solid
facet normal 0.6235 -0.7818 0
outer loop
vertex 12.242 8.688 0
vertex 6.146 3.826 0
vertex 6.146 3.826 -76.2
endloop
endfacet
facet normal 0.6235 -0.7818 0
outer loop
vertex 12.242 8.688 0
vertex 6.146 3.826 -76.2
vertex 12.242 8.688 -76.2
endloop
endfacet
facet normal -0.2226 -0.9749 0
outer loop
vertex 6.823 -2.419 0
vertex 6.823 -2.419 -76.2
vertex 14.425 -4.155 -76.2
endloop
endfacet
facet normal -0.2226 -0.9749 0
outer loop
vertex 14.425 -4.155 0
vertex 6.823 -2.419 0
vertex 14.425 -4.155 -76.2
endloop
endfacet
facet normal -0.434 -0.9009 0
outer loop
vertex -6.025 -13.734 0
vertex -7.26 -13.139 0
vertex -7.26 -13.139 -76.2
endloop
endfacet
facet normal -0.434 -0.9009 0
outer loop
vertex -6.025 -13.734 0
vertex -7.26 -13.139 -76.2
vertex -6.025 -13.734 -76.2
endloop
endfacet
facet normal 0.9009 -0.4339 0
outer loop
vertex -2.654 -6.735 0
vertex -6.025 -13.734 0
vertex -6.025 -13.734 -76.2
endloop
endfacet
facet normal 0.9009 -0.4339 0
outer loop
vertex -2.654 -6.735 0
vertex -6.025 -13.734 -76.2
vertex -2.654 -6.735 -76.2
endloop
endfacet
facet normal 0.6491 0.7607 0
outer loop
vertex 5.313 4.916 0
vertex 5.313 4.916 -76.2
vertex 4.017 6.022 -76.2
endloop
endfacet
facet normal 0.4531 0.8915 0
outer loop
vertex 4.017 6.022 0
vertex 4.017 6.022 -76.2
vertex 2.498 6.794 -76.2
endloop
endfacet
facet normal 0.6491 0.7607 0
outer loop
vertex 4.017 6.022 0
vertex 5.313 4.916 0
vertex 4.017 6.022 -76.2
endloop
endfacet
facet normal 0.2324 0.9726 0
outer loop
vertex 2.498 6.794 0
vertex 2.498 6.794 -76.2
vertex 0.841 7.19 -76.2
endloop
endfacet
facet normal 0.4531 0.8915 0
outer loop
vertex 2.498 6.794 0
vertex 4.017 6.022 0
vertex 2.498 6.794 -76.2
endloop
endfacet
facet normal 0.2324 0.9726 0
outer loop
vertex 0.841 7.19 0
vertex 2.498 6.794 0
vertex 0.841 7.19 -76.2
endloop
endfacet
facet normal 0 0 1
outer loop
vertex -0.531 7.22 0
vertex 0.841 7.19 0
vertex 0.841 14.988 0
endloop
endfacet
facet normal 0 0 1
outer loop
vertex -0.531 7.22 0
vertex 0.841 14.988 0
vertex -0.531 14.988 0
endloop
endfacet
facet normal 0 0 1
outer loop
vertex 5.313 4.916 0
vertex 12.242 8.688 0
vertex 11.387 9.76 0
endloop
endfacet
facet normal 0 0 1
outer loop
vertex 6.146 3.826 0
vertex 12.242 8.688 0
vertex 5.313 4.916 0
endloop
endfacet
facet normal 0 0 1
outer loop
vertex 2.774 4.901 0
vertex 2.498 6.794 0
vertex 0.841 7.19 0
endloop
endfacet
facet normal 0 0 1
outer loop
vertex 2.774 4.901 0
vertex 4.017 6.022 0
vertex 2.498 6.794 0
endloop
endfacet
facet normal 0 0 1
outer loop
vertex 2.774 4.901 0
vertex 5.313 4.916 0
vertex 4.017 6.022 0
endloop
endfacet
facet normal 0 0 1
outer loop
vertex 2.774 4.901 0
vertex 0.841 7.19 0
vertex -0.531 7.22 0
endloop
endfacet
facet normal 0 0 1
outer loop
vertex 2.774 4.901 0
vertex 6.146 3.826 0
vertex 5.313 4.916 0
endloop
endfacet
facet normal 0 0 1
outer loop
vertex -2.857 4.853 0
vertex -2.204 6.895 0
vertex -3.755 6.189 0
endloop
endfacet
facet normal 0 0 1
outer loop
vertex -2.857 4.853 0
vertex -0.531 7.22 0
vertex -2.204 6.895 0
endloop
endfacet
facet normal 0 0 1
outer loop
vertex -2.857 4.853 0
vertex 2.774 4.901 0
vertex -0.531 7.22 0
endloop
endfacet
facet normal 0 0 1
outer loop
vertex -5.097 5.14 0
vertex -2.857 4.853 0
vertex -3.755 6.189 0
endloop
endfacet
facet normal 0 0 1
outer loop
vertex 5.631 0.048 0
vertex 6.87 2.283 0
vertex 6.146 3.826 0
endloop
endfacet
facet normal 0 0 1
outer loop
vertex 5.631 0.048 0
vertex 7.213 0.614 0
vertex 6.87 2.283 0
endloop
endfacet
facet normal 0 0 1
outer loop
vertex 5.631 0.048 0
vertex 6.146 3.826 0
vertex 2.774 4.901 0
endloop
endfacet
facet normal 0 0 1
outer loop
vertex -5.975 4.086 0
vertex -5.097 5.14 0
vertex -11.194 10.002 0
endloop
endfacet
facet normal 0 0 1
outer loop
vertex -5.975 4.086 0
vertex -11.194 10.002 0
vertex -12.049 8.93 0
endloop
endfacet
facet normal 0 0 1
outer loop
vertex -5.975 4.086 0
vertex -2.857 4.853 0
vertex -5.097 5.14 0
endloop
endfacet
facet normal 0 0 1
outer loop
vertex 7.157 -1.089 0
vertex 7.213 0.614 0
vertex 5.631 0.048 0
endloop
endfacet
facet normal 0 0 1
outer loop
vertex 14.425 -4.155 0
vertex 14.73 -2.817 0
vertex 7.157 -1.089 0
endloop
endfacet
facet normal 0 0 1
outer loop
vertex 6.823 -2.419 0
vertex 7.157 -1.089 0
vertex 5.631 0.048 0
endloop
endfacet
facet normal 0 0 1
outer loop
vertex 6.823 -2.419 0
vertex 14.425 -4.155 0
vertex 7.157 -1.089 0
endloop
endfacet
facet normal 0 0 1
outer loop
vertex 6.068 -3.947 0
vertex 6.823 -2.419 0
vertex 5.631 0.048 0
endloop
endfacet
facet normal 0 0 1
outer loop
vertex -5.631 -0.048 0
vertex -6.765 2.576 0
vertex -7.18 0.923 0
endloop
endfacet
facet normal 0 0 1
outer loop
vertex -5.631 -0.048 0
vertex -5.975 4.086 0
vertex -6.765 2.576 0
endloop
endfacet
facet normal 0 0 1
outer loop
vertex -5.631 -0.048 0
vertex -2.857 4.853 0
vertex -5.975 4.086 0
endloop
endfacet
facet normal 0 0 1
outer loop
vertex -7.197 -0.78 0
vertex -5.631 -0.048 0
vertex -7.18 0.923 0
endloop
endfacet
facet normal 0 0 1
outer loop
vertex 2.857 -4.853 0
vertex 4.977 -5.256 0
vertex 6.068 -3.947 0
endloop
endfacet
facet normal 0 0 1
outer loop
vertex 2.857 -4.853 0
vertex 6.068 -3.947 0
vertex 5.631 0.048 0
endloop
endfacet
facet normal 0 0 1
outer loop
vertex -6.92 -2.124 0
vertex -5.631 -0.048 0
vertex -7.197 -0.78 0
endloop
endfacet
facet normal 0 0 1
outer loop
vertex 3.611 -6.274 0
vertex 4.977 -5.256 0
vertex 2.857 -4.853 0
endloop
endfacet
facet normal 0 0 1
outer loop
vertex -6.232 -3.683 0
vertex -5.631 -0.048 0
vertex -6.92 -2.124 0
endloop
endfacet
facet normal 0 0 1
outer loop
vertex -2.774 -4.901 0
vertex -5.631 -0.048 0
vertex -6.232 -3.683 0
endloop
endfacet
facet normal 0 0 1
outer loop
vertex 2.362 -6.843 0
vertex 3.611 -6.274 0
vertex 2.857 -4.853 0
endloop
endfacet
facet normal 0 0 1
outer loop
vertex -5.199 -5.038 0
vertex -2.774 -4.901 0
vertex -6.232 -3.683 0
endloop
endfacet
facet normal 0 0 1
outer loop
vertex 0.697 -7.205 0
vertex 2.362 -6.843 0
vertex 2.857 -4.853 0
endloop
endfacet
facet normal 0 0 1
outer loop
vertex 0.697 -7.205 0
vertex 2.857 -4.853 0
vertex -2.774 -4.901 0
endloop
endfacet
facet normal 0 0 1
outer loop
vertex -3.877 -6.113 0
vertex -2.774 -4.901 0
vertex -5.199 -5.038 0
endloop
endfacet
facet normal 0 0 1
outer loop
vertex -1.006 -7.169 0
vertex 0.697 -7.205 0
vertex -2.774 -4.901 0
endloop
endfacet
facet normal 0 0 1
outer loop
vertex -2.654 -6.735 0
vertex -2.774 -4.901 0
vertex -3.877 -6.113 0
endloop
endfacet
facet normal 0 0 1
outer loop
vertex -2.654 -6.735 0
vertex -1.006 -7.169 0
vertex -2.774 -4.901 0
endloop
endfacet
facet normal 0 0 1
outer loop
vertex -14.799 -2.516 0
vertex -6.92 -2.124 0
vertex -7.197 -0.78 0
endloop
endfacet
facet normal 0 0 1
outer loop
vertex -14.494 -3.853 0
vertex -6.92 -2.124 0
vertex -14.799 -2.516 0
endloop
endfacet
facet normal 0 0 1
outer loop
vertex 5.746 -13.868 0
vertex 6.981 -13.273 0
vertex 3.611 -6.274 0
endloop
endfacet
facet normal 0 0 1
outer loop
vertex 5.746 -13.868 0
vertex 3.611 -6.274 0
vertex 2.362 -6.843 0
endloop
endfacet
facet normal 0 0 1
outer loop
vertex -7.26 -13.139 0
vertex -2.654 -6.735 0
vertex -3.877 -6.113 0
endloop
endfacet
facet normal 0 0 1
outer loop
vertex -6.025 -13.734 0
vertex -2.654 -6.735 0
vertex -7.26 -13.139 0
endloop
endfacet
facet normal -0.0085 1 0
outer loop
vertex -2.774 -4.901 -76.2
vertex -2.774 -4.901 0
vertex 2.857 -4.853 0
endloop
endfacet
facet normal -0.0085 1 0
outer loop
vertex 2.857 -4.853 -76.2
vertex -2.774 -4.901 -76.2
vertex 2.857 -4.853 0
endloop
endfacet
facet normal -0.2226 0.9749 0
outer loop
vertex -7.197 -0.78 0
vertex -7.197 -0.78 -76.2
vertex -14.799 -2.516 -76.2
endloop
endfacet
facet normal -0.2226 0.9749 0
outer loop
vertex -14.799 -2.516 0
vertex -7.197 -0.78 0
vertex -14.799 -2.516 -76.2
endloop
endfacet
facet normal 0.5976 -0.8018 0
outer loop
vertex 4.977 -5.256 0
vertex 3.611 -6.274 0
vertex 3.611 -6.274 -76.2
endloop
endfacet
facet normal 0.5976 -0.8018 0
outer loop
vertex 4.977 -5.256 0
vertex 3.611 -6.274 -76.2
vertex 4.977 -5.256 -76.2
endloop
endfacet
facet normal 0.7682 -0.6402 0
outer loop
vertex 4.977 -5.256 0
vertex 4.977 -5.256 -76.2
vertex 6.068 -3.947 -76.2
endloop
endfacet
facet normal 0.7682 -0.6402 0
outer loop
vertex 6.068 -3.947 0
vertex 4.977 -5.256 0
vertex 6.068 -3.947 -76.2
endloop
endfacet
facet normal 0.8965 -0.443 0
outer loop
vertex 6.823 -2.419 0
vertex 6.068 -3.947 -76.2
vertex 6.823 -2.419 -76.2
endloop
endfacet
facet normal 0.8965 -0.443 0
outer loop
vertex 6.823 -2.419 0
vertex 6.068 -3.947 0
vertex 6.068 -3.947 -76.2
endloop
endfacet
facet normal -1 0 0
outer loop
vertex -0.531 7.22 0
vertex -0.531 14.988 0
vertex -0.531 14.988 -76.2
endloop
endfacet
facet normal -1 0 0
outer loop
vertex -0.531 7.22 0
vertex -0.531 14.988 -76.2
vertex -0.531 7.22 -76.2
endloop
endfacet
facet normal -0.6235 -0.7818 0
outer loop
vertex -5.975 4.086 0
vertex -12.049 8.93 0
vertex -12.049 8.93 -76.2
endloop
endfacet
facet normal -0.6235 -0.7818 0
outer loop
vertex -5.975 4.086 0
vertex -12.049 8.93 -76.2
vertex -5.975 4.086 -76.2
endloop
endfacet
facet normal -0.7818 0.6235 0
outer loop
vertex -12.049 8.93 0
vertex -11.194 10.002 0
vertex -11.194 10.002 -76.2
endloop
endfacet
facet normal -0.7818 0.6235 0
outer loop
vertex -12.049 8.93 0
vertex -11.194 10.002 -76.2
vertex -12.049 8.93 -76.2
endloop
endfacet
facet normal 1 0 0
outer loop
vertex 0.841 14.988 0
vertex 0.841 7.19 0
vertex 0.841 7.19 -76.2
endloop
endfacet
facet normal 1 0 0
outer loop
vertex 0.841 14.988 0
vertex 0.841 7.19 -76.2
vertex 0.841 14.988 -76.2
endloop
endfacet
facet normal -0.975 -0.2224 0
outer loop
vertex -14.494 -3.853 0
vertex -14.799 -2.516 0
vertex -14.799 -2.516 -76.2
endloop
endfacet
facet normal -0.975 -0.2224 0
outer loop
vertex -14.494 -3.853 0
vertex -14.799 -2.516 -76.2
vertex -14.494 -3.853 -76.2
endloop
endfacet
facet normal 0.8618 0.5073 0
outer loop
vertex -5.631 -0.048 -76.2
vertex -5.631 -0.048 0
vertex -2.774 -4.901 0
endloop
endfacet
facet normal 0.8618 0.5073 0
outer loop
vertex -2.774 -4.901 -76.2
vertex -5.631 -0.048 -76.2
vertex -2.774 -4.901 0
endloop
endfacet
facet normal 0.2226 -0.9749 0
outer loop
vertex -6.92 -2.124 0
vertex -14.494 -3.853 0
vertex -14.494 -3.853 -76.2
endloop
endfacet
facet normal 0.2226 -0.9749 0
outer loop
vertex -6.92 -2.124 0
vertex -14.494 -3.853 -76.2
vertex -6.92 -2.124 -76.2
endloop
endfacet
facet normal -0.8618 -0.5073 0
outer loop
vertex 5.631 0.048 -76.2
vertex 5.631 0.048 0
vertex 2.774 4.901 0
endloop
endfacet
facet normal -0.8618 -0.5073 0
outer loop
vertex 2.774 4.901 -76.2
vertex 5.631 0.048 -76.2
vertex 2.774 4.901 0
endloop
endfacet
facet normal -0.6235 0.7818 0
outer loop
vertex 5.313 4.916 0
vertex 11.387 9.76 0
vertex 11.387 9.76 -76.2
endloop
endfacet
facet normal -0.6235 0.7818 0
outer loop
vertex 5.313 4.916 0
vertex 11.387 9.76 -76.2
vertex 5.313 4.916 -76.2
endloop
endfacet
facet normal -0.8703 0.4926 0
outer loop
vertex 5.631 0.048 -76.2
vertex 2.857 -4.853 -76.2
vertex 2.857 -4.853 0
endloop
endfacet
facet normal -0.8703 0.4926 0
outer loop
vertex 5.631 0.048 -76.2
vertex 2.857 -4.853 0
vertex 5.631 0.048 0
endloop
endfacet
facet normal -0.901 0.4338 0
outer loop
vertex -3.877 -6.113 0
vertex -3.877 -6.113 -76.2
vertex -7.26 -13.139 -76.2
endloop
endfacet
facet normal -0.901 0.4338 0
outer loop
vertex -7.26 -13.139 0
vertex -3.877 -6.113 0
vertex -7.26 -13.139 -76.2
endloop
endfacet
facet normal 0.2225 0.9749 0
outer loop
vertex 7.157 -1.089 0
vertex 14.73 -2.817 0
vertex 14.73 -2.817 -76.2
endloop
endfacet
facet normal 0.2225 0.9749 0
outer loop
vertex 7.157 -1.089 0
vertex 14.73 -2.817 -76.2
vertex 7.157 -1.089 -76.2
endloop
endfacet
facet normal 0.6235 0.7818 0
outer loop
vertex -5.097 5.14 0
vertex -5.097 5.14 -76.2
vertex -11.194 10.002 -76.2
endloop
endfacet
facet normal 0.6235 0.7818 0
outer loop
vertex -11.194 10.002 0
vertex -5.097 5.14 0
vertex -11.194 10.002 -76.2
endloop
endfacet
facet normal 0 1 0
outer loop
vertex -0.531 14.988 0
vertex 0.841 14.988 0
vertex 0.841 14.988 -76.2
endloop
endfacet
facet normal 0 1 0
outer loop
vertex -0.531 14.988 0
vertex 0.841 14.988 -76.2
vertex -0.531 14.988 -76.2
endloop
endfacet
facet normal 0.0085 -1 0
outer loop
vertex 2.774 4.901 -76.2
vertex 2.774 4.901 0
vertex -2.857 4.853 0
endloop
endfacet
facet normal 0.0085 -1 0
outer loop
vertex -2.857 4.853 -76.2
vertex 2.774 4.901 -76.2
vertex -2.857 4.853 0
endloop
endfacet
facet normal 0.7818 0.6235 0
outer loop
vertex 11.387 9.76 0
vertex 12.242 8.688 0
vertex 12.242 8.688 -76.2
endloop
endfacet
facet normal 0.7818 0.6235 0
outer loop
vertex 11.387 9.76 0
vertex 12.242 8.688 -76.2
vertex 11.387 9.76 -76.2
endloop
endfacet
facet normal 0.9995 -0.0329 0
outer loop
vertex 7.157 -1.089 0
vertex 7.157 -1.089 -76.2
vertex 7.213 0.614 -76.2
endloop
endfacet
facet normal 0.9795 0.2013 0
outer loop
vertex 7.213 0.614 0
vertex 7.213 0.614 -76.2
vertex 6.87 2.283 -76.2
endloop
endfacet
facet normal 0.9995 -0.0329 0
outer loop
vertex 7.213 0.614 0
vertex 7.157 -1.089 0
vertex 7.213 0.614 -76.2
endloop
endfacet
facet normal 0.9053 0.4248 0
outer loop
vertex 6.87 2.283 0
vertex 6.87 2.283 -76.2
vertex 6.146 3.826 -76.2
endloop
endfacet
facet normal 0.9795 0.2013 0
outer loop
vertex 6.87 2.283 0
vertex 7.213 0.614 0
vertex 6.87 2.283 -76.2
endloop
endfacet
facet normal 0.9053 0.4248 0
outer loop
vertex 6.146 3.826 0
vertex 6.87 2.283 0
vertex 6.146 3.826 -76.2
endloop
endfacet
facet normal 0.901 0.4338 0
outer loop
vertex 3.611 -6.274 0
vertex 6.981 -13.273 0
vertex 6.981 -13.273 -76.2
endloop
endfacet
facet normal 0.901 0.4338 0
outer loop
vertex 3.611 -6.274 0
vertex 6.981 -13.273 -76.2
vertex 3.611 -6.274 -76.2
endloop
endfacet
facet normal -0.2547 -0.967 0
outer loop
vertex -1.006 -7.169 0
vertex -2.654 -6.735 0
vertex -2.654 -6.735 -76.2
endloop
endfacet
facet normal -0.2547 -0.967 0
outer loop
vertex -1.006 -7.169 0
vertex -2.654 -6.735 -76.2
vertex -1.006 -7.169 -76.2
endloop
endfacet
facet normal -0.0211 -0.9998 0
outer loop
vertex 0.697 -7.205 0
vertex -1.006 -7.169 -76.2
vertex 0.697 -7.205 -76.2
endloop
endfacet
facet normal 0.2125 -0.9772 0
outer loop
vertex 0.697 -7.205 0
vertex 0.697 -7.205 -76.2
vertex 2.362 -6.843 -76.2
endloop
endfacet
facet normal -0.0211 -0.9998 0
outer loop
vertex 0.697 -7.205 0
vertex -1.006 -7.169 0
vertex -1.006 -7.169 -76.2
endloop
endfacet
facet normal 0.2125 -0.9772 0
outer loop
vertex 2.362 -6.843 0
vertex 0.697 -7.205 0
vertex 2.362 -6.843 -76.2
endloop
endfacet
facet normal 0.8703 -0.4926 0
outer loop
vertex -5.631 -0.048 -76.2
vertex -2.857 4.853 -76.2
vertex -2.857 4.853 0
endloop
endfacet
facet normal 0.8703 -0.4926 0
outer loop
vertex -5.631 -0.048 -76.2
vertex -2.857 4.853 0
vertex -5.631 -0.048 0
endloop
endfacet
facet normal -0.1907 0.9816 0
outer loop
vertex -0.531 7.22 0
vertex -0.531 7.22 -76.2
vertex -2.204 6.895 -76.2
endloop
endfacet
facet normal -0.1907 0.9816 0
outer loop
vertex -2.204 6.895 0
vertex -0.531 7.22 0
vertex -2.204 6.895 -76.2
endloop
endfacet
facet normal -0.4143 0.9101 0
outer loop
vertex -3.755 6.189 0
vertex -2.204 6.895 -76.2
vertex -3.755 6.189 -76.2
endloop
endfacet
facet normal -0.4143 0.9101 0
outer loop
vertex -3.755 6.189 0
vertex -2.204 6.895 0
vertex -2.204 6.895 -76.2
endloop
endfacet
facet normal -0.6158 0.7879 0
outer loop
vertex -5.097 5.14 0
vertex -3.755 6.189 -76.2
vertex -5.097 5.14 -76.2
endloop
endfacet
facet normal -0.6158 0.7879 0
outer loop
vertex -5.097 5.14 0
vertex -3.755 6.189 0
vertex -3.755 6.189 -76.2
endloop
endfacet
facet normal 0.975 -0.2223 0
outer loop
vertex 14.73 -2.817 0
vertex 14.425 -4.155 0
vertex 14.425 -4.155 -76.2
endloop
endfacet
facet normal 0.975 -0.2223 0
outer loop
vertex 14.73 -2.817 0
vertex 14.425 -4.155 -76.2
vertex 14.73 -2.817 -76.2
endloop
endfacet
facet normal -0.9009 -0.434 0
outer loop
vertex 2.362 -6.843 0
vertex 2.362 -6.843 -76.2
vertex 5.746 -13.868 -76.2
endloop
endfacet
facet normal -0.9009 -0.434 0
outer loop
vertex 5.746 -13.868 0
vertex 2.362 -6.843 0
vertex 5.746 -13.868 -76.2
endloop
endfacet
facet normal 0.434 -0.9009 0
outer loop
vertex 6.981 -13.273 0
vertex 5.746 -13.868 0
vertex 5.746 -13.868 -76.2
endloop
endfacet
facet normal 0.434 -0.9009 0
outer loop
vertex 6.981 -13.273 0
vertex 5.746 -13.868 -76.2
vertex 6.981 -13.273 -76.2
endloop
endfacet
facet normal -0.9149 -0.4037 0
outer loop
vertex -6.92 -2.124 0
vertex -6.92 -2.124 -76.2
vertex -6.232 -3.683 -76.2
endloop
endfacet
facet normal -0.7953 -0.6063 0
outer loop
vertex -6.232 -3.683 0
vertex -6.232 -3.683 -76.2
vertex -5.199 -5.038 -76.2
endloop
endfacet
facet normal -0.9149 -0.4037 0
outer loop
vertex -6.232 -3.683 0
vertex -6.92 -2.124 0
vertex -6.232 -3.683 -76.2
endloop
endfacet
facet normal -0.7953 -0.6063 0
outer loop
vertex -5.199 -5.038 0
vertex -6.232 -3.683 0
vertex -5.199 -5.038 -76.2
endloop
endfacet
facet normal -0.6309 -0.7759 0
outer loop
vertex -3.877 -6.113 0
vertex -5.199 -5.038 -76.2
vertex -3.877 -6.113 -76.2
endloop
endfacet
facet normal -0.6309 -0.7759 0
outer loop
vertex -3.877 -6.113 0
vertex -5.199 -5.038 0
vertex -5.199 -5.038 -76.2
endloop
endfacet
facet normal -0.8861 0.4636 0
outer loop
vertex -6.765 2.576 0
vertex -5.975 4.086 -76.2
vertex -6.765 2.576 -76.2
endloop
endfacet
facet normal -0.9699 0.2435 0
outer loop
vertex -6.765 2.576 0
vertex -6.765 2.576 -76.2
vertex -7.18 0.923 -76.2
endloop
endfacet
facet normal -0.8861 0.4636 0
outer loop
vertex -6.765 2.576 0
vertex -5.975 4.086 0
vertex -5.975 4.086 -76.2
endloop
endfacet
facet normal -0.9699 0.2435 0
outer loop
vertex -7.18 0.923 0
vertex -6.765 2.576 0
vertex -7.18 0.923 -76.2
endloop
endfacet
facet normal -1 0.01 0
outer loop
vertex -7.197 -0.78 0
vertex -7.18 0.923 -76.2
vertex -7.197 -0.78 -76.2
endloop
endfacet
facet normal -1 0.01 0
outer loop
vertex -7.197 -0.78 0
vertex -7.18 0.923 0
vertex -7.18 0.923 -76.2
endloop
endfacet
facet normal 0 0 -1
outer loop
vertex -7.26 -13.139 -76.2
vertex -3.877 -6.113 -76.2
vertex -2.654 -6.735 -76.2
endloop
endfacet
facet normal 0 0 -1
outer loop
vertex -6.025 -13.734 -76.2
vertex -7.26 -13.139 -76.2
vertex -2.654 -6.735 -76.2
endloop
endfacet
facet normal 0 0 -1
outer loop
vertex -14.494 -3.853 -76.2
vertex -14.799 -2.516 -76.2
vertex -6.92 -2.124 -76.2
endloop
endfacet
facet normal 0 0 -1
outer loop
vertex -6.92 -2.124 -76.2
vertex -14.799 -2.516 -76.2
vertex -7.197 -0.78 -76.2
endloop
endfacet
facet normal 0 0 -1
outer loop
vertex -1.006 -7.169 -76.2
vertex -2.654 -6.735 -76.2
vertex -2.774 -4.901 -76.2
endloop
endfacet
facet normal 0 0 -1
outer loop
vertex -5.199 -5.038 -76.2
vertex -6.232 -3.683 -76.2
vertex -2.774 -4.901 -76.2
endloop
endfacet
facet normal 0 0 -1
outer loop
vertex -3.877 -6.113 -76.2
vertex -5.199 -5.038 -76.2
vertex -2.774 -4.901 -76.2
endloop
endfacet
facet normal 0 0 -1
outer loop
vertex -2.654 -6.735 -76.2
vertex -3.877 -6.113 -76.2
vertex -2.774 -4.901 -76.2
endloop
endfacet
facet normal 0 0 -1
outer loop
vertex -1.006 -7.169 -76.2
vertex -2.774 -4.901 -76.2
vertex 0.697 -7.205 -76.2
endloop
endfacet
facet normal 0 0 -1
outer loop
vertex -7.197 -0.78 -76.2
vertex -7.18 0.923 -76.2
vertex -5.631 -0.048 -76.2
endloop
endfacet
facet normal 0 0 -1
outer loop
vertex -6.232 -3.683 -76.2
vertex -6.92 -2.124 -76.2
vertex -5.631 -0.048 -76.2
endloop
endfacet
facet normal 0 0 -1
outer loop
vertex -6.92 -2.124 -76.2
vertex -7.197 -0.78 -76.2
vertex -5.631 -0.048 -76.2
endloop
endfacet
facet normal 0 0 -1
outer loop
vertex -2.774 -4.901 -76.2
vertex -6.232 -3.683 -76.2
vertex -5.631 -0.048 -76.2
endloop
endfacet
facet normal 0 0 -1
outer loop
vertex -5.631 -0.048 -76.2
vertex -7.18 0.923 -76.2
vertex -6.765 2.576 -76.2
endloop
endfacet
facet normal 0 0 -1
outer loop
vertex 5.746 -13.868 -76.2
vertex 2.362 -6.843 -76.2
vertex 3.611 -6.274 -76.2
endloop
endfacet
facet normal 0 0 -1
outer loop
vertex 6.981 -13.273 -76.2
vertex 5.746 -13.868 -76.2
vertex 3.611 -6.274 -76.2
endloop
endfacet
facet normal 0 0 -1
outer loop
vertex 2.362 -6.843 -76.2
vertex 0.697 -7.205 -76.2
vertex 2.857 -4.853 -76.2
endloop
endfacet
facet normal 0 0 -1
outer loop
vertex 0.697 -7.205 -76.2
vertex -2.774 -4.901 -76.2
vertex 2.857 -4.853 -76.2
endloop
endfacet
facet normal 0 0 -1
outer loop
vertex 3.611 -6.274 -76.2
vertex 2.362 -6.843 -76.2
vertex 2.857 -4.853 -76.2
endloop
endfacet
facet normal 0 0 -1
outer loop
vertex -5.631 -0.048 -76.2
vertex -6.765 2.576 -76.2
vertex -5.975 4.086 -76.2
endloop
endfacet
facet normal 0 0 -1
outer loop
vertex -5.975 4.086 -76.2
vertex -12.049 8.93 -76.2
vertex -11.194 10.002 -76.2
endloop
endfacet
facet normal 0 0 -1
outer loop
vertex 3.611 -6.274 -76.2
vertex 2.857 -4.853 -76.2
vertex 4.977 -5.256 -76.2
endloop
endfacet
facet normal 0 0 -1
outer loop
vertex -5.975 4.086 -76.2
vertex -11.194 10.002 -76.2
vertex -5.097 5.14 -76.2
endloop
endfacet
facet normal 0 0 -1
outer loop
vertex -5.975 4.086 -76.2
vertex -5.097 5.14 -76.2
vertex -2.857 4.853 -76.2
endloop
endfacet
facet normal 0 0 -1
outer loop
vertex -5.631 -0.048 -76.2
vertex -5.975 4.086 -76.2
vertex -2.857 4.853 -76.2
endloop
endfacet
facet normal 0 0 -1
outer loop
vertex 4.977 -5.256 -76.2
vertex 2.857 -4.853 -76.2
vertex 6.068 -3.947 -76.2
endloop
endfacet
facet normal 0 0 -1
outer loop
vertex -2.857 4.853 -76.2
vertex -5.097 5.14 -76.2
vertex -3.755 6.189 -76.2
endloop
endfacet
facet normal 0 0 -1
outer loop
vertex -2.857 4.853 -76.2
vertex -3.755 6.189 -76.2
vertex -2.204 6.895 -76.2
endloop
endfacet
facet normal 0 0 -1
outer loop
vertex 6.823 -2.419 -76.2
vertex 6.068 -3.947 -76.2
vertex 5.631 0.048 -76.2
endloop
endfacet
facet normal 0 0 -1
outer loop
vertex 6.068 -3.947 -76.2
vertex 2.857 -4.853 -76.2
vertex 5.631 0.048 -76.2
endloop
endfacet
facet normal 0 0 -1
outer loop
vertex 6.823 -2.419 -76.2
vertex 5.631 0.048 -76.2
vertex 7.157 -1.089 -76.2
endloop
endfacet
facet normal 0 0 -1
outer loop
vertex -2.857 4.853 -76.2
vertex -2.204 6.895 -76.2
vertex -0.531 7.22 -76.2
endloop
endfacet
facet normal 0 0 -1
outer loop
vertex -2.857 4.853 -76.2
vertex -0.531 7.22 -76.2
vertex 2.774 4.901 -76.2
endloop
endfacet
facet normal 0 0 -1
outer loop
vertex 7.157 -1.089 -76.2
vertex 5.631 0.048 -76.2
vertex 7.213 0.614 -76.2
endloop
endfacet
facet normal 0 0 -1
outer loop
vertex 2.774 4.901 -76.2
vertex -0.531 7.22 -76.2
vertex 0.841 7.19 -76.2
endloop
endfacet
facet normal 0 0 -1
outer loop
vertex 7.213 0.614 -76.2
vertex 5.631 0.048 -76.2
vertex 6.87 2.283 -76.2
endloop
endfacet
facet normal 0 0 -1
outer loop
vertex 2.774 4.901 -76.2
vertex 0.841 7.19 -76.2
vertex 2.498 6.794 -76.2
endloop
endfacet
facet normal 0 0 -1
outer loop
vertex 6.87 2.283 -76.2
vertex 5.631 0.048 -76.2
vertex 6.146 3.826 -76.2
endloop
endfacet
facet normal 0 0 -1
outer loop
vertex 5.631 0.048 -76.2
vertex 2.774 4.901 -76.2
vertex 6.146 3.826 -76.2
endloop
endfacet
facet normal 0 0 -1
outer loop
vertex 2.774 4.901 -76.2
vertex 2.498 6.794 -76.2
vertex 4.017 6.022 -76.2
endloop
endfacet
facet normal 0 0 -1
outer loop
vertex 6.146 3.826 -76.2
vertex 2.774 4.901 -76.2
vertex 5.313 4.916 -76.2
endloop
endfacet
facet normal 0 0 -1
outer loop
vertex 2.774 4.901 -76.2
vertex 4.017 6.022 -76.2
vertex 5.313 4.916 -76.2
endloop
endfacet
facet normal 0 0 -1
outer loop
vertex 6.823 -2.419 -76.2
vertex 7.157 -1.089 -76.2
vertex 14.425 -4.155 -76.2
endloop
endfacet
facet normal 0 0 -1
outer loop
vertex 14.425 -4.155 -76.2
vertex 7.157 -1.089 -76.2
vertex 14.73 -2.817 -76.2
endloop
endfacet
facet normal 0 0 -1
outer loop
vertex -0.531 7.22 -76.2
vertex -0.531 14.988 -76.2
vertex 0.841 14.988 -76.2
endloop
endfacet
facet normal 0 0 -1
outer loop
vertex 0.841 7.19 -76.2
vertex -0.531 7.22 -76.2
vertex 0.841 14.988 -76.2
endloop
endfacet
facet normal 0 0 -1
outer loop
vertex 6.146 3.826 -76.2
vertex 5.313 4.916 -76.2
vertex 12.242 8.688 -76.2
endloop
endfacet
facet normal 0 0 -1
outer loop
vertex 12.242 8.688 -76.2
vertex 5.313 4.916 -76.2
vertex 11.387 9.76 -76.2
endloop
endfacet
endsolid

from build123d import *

# Parameters (mm, degrees)
BOSS_EXTRUDE1_DEPTH = 76.2
SKETCH6_R           = 7.239
BOSS_EXTRUDE2_DEPTH = 76.2
CIRPATTERN1_COUNT   = 7
CUT_EXTRUDE5_DEPTH  = 80.057508243


with BuildPart() as part:
    # Sketch12 → Boss-Extrude1 (new body)
    with BuildSketch(Plane.XY):
        Polygon((0, 0), (0.8406384, 0), (0.8406384, 14.987843642), (-0.5309616, 14.987843642), (-0.5309616, 0), align=None)
    boss_extrude1 = extrude(amount=-BOSS_EXTRUDE1_DEPTH)

    # Sketch6 → Boss-Extrude2 (add)
    with BuildSketch(Plane.XY):
        Circle(SKETCH6_R)
    extrude(amount=-BOSS_EXTRUDE2_DEPTH)

    # CirPattern1: Boss-Extrude1 ×7 about axis
    cirpattern1_axis = Axis((0, 0, -76.2), (0, 0, 1))
    for i in range(1, CIRPATTERN1_COUNT):
        add(boss_extrude1.rotate(cirpattern1_axis, i * 360 / CIRPATTERN1_COUNT))

    # Sketch8 → Cut-Extrude5 (cut, through all)
    with BuildSketch(Plane.XY):
        Polygon((5.6310401, 0.047871874), (2.774061791, 4.900559713), (-2.856978309, 4.852687839), (-5.6310401, -0.047871874), (-2.774061791, -4.900559713), (2.856978309, -4.852687839), align=None)
    extrude(amount=-CUT_EXTRUDE5_DEPTH, mode=Mode.SUBTRACT)


solid = part.part
